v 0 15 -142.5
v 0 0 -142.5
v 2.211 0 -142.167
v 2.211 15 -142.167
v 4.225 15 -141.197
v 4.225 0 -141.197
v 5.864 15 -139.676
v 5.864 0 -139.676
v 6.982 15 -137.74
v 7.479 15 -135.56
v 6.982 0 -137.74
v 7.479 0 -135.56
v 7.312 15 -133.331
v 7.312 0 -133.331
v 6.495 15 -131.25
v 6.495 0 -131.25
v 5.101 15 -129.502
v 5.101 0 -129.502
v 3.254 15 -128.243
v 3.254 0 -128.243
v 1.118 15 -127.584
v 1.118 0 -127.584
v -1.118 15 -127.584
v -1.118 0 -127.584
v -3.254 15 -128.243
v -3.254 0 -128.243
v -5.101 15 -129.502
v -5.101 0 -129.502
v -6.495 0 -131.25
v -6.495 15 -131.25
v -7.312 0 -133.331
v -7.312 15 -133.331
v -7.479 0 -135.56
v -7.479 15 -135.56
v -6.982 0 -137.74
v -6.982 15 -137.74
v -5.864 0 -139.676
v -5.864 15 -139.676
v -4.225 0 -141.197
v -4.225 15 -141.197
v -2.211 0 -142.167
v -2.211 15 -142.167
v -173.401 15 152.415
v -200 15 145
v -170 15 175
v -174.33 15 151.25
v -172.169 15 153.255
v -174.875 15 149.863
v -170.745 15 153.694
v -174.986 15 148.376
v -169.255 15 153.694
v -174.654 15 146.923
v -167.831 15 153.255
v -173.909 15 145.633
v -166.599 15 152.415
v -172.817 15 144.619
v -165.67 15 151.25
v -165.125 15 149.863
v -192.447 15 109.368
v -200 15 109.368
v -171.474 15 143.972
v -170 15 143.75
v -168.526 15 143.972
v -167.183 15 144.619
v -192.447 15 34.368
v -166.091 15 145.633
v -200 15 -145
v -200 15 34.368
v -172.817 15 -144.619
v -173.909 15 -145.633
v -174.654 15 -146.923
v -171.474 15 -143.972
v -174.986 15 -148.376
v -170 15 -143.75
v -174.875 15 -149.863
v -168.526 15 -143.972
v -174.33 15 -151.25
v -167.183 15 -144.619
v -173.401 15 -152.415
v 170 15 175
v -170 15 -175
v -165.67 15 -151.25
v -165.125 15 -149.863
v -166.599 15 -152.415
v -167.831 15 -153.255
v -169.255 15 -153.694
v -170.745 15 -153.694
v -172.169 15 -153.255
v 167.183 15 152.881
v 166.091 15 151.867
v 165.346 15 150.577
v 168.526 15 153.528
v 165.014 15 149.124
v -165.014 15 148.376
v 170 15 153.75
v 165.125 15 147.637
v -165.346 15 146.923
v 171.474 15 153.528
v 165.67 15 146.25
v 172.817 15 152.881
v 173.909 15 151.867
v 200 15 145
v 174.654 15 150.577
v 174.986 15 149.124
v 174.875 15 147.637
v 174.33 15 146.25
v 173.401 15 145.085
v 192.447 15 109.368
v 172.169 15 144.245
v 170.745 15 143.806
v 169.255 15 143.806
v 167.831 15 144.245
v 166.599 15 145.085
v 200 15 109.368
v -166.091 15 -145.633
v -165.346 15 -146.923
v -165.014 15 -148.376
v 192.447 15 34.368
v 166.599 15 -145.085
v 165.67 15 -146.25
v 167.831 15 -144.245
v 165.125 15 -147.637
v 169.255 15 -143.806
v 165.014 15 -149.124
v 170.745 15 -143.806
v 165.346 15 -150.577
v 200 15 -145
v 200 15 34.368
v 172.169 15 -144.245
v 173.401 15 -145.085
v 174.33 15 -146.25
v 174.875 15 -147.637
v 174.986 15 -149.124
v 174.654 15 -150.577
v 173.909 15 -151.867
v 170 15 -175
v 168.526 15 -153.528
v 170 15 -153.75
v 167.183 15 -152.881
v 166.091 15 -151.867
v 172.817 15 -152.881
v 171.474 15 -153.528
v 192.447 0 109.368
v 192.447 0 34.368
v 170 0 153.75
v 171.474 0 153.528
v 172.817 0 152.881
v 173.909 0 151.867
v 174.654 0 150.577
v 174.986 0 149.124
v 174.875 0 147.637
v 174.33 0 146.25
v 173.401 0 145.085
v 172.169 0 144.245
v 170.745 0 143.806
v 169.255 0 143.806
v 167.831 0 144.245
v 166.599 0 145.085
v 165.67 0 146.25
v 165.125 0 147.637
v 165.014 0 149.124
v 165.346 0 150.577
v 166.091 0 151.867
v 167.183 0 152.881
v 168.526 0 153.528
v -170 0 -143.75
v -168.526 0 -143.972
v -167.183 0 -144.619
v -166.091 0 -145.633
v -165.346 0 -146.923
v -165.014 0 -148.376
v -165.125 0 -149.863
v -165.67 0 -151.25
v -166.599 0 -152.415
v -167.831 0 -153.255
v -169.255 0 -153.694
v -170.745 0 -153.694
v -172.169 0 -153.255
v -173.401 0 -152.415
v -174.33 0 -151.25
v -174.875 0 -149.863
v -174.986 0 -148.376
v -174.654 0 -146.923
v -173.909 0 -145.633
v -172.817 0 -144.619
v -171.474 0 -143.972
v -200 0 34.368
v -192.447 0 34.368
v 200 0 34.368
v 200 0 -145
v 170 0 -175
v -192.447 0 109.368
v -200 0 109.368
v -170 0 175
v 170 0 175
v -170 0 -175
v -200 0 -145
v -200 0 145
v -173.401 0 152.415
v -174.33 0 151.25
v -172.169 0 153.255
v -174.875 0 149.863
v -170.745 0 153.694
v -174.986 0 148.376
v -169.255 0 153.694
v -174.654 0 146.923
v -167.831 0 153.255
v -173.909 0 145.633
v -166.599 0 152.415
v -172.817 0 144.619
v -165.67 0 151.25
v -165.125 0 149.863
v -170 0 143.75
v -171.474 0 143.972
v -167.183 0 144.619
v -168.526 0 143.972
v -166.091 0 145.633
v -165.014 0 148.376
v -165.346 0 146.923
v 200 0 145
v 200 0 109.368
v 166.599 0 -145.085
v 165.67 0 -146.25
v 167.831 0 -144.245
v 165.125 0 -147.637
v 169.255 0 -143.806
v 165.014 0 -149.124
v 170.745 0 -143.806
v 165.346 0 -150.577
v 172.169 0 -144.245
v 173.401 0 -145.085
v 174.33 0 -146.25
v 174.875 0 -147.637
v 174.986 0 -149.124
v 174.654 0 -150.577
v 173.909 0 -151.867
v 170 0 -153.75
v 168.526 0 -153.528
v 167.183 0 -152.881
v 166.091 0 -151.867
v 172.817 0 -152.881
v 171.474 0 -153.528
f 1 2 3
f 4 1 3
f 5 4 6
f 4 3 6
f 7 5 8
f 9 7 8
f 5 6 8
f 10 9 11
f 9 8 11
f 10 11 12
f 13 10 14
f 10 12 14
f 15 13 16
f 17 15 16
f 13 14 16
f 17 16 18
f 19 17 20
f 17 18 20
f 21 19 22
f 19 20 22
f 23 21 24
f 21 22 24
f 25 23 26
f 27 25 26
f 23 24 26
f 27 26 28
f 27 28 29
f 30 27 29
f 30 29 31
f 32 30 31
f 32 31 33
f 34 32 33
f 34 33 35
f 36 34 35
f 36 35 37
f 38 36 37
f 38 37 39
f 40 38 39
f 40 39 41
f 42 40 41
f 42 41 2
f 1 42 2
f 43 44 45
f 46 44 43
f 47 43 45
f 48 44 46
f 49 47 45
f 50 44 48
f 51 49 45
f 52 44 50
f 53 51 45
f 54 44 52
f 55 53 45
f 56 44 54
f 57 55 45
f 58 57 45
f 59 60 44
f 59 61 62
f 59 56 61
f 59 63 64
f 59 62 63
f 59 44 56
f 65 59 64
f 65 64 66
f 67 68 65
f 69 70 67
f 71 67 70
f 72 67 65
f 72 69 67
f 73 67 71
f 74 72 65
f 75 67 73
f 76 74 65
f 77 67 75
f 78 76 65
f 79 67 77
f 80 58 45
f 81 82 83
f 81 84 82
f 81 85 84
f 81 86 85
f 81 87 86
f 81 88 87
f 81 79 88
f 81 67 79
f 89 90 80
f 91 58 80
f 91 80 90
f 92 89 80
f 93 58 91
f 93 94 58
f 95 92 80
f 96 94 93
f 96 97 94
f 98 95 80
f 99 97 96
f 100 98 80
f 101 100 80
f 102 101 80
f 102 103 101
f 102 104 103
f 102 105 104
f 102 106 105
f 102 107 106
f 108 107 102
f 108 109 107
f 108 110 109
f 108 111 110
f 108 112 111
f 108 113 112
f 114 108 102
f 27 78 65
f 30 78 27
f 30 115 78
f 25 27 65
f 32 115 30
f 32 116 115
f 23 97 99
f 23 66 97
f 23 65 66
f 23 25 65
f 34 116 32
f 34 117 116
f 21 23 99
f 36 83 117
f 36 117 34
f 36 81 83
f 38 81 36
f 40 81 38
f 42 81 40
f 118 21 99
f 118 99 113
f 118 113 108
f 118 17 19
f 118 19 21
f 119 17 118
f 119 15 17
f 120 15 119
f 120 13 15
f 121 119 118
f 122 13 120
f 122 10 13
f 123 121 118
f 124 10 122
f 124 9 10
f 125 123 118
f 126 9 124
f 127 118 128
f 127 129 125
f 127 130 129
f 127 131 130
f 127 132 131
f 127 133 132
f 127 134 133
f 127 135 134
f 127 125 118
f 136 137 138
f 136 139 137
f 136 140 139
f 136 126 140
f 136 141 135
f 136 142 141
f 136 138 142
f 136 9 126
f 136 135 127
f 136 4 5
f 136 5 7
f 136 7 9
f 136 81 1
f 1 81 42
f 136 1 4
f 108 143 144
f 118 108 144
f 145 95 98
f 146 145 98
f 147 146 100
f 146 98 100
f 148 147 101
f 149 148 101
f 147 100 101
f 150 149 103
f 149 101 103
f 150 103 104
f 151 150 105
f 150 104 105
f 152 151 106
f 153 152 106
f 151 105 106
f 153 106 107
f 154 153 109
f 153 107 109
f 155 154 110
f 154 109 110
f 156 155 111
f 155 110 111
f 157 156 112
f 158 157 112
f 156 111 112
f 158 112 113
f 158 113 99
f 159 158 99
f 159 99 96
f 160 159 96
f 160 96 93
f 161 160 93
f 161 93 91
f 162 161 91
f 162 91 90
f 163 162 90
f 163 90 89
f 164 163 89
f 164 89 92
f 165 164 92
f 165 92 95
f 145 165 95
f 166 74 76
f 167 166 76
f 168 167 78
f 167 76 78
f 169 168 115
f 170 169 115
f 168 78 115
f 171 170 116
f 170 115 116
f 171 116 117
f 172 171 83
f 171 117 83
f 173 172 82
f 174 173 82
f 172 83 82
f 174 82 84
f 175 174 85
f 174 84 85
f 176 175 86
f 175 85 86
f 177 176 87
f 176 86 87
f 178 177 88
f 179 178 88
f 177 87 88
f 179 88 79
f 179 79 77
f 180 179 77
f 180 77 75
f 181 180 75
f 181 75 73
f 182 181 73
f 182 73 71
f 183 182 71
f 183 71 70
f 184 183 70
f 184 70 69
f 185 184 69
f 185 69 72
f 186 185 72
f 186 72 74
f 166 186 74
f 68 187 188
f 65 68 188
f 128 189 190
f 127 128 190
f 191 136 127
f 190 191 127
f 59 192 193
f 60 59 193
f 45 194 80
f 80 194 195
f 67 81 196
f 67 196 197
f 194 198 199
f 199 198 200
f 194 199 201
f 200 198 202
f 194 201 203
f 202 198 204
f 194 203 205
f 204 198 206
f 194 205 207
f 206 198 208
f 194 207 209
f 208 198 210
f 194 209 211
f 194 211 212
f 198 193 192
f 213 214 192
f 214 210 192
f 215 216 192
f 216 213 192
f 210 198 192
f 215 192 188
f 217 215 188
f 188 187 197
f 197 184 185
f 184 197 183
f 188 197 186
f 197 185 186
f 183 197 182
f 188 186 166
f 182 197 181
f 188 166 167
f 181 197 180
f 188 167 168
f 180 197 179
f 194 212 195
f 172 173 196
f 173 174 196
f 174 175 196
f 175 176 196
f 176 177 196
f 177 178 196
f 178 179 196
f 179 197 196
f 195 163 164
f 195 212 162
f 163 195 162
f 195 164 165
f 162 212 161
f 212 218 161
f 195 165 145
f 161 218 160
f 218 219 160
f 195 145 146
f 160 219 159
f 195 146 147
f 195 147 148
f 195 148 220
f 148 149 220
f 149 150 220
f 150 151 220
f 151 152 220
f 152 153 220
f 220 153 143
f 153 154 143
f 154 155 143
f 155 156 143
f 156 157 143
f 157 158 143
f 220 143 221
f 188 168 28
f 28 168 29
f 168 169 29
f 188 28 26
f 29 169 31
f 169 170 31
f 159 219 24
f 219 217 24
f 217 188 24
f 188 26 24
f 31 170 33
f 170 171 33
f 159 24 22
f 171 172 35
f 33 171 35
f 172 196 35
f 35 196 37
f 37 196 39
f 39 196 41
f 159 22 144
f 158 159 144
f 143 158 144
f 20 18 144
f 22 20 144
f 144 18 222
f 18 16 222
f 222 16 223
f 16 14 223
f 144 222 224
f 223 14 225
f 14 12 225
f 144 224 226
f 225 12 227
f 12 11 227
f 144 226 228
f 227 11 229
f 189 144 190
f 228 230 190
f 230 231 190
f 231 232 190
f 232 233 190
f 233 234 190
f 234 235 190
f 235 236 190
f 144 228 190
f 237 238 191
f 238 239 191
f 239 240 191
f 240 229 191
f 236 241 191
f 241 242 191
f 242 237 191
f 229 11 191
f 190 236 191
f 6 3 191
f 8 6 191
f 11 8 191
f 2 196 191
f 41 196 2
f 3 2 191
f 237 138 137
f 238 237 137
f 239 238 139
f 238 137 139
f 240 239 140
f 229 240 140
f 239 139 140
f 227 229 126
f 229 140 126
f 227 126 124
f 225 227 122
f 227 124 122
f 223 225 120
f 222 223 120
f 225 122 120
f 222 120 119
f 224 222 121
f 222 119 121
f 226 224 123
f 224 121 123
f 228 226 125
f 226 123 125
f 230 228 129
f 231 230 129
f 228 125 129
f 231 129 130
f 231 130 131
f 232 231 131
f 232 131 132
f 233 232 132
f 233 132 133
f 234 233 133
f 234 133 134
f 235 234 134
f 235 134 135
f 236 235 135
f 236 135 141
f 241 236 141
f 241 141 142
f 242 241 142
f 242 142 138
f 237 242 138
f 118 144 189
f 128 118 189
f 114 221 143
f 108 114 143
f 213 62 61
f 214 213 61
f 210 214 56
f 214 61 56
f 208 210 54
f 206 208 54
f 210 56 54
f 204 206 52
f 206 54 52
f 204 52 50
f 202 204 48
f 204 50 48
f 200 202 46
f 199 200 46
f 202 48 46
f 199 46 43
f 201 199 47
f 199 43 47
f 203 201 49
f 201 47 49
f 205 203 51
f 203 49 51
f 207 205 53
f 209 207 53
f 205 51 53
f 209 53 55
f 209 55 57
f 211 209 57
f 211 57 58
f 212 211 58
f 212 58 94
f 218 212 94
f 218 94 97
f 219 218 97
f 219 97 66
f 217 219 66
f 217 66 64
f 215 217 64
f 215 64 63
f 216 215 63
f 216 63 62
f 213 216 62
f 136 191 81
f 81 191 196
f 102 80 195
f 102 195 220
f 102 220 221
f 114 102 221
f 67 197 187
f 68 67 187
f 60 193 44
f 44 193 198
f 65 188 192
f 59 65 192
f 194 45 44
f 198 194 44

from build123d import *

# Parameters (mm, degrees)
BOSS_EXTRUDE1_DEPTH = 15
SKETCH4_R           = 5
CUT_EXTRUDE1_DEPTH  = 267.176633084
SKETCH5_R           = 7.5
CUT_EXTRUDE2_DEPTH  = 267.176633084


with BuildPart() as part:
    # Sketch1 → Boss-Extrude1 (new body)
    with BuildSketch(Plane(origin=(0, 0, 0), x_dir=(1, 0, 0), z_dir=(0, 1, 0))):
        Polygon((-200, -175), (200, -175), (200, -109.36837475), (192.446978441, -109.36837475), (192.446978441, -34.36837475), (200, -34.36837475), (200, 175), (-200, 175), (-200, -34.36837475), (-192.446978441, -34.36837475), (-192.446978441, -109.36837475), (-200, -109.36837475), align=None)
    extrude(amount=BOSS_EXTRUDE1_DEPTH)

    # Sketch4 → Cut-Extrude1 (cut, through all)
    with BuildSketch(Plane(origin=(0, 15, 0), x_dir=(1, 0, 0), z_dir=(0, 1, 0))):
        with Locations(Location((-170, 148.75, 0), (0, 0, 270))):
            Circle(SKETCH4_R)
        with Locations(Location((170, 148.75, 0), (0, 0, 90))):
            Circle(SKETCH4_R)
        with Locations(Location((170, -148.75, 0), (0, 0, 270))):
            Circle(SKETCH4_R)
        with Locations(Location((-170, -148.75, 0), (0, 0, 90))):
            Circle(SKETCH4_R)
        Polygon((-170, 175), (-200, 145), (-200, 175), align=None)
        Polygon((-200, -145), (-200, -175), (-170, -175), align=None)
        Polygon((170, -175), (200, -145), (200, -175), align=None)
        Polygon((200, 145), (200, 175), (170, 175), align=None)
    extrude(amount=-CUT_EXTRUDE1_DEPTH, mode=Mode.SUBTRACT)

    # Sketch5 → Cut-Extrude2 (cut, through all)
    with BuildSketch(Plane.XZ):
        with Locations(Location((0, -135, 0), (0, 0, 270))):
            Circle(SKETCH5_R)
    extrude(amount=-CUT_EXTRUDE2_DEPTH, mode=Mode.SUBTRACT)


solid = part.part
